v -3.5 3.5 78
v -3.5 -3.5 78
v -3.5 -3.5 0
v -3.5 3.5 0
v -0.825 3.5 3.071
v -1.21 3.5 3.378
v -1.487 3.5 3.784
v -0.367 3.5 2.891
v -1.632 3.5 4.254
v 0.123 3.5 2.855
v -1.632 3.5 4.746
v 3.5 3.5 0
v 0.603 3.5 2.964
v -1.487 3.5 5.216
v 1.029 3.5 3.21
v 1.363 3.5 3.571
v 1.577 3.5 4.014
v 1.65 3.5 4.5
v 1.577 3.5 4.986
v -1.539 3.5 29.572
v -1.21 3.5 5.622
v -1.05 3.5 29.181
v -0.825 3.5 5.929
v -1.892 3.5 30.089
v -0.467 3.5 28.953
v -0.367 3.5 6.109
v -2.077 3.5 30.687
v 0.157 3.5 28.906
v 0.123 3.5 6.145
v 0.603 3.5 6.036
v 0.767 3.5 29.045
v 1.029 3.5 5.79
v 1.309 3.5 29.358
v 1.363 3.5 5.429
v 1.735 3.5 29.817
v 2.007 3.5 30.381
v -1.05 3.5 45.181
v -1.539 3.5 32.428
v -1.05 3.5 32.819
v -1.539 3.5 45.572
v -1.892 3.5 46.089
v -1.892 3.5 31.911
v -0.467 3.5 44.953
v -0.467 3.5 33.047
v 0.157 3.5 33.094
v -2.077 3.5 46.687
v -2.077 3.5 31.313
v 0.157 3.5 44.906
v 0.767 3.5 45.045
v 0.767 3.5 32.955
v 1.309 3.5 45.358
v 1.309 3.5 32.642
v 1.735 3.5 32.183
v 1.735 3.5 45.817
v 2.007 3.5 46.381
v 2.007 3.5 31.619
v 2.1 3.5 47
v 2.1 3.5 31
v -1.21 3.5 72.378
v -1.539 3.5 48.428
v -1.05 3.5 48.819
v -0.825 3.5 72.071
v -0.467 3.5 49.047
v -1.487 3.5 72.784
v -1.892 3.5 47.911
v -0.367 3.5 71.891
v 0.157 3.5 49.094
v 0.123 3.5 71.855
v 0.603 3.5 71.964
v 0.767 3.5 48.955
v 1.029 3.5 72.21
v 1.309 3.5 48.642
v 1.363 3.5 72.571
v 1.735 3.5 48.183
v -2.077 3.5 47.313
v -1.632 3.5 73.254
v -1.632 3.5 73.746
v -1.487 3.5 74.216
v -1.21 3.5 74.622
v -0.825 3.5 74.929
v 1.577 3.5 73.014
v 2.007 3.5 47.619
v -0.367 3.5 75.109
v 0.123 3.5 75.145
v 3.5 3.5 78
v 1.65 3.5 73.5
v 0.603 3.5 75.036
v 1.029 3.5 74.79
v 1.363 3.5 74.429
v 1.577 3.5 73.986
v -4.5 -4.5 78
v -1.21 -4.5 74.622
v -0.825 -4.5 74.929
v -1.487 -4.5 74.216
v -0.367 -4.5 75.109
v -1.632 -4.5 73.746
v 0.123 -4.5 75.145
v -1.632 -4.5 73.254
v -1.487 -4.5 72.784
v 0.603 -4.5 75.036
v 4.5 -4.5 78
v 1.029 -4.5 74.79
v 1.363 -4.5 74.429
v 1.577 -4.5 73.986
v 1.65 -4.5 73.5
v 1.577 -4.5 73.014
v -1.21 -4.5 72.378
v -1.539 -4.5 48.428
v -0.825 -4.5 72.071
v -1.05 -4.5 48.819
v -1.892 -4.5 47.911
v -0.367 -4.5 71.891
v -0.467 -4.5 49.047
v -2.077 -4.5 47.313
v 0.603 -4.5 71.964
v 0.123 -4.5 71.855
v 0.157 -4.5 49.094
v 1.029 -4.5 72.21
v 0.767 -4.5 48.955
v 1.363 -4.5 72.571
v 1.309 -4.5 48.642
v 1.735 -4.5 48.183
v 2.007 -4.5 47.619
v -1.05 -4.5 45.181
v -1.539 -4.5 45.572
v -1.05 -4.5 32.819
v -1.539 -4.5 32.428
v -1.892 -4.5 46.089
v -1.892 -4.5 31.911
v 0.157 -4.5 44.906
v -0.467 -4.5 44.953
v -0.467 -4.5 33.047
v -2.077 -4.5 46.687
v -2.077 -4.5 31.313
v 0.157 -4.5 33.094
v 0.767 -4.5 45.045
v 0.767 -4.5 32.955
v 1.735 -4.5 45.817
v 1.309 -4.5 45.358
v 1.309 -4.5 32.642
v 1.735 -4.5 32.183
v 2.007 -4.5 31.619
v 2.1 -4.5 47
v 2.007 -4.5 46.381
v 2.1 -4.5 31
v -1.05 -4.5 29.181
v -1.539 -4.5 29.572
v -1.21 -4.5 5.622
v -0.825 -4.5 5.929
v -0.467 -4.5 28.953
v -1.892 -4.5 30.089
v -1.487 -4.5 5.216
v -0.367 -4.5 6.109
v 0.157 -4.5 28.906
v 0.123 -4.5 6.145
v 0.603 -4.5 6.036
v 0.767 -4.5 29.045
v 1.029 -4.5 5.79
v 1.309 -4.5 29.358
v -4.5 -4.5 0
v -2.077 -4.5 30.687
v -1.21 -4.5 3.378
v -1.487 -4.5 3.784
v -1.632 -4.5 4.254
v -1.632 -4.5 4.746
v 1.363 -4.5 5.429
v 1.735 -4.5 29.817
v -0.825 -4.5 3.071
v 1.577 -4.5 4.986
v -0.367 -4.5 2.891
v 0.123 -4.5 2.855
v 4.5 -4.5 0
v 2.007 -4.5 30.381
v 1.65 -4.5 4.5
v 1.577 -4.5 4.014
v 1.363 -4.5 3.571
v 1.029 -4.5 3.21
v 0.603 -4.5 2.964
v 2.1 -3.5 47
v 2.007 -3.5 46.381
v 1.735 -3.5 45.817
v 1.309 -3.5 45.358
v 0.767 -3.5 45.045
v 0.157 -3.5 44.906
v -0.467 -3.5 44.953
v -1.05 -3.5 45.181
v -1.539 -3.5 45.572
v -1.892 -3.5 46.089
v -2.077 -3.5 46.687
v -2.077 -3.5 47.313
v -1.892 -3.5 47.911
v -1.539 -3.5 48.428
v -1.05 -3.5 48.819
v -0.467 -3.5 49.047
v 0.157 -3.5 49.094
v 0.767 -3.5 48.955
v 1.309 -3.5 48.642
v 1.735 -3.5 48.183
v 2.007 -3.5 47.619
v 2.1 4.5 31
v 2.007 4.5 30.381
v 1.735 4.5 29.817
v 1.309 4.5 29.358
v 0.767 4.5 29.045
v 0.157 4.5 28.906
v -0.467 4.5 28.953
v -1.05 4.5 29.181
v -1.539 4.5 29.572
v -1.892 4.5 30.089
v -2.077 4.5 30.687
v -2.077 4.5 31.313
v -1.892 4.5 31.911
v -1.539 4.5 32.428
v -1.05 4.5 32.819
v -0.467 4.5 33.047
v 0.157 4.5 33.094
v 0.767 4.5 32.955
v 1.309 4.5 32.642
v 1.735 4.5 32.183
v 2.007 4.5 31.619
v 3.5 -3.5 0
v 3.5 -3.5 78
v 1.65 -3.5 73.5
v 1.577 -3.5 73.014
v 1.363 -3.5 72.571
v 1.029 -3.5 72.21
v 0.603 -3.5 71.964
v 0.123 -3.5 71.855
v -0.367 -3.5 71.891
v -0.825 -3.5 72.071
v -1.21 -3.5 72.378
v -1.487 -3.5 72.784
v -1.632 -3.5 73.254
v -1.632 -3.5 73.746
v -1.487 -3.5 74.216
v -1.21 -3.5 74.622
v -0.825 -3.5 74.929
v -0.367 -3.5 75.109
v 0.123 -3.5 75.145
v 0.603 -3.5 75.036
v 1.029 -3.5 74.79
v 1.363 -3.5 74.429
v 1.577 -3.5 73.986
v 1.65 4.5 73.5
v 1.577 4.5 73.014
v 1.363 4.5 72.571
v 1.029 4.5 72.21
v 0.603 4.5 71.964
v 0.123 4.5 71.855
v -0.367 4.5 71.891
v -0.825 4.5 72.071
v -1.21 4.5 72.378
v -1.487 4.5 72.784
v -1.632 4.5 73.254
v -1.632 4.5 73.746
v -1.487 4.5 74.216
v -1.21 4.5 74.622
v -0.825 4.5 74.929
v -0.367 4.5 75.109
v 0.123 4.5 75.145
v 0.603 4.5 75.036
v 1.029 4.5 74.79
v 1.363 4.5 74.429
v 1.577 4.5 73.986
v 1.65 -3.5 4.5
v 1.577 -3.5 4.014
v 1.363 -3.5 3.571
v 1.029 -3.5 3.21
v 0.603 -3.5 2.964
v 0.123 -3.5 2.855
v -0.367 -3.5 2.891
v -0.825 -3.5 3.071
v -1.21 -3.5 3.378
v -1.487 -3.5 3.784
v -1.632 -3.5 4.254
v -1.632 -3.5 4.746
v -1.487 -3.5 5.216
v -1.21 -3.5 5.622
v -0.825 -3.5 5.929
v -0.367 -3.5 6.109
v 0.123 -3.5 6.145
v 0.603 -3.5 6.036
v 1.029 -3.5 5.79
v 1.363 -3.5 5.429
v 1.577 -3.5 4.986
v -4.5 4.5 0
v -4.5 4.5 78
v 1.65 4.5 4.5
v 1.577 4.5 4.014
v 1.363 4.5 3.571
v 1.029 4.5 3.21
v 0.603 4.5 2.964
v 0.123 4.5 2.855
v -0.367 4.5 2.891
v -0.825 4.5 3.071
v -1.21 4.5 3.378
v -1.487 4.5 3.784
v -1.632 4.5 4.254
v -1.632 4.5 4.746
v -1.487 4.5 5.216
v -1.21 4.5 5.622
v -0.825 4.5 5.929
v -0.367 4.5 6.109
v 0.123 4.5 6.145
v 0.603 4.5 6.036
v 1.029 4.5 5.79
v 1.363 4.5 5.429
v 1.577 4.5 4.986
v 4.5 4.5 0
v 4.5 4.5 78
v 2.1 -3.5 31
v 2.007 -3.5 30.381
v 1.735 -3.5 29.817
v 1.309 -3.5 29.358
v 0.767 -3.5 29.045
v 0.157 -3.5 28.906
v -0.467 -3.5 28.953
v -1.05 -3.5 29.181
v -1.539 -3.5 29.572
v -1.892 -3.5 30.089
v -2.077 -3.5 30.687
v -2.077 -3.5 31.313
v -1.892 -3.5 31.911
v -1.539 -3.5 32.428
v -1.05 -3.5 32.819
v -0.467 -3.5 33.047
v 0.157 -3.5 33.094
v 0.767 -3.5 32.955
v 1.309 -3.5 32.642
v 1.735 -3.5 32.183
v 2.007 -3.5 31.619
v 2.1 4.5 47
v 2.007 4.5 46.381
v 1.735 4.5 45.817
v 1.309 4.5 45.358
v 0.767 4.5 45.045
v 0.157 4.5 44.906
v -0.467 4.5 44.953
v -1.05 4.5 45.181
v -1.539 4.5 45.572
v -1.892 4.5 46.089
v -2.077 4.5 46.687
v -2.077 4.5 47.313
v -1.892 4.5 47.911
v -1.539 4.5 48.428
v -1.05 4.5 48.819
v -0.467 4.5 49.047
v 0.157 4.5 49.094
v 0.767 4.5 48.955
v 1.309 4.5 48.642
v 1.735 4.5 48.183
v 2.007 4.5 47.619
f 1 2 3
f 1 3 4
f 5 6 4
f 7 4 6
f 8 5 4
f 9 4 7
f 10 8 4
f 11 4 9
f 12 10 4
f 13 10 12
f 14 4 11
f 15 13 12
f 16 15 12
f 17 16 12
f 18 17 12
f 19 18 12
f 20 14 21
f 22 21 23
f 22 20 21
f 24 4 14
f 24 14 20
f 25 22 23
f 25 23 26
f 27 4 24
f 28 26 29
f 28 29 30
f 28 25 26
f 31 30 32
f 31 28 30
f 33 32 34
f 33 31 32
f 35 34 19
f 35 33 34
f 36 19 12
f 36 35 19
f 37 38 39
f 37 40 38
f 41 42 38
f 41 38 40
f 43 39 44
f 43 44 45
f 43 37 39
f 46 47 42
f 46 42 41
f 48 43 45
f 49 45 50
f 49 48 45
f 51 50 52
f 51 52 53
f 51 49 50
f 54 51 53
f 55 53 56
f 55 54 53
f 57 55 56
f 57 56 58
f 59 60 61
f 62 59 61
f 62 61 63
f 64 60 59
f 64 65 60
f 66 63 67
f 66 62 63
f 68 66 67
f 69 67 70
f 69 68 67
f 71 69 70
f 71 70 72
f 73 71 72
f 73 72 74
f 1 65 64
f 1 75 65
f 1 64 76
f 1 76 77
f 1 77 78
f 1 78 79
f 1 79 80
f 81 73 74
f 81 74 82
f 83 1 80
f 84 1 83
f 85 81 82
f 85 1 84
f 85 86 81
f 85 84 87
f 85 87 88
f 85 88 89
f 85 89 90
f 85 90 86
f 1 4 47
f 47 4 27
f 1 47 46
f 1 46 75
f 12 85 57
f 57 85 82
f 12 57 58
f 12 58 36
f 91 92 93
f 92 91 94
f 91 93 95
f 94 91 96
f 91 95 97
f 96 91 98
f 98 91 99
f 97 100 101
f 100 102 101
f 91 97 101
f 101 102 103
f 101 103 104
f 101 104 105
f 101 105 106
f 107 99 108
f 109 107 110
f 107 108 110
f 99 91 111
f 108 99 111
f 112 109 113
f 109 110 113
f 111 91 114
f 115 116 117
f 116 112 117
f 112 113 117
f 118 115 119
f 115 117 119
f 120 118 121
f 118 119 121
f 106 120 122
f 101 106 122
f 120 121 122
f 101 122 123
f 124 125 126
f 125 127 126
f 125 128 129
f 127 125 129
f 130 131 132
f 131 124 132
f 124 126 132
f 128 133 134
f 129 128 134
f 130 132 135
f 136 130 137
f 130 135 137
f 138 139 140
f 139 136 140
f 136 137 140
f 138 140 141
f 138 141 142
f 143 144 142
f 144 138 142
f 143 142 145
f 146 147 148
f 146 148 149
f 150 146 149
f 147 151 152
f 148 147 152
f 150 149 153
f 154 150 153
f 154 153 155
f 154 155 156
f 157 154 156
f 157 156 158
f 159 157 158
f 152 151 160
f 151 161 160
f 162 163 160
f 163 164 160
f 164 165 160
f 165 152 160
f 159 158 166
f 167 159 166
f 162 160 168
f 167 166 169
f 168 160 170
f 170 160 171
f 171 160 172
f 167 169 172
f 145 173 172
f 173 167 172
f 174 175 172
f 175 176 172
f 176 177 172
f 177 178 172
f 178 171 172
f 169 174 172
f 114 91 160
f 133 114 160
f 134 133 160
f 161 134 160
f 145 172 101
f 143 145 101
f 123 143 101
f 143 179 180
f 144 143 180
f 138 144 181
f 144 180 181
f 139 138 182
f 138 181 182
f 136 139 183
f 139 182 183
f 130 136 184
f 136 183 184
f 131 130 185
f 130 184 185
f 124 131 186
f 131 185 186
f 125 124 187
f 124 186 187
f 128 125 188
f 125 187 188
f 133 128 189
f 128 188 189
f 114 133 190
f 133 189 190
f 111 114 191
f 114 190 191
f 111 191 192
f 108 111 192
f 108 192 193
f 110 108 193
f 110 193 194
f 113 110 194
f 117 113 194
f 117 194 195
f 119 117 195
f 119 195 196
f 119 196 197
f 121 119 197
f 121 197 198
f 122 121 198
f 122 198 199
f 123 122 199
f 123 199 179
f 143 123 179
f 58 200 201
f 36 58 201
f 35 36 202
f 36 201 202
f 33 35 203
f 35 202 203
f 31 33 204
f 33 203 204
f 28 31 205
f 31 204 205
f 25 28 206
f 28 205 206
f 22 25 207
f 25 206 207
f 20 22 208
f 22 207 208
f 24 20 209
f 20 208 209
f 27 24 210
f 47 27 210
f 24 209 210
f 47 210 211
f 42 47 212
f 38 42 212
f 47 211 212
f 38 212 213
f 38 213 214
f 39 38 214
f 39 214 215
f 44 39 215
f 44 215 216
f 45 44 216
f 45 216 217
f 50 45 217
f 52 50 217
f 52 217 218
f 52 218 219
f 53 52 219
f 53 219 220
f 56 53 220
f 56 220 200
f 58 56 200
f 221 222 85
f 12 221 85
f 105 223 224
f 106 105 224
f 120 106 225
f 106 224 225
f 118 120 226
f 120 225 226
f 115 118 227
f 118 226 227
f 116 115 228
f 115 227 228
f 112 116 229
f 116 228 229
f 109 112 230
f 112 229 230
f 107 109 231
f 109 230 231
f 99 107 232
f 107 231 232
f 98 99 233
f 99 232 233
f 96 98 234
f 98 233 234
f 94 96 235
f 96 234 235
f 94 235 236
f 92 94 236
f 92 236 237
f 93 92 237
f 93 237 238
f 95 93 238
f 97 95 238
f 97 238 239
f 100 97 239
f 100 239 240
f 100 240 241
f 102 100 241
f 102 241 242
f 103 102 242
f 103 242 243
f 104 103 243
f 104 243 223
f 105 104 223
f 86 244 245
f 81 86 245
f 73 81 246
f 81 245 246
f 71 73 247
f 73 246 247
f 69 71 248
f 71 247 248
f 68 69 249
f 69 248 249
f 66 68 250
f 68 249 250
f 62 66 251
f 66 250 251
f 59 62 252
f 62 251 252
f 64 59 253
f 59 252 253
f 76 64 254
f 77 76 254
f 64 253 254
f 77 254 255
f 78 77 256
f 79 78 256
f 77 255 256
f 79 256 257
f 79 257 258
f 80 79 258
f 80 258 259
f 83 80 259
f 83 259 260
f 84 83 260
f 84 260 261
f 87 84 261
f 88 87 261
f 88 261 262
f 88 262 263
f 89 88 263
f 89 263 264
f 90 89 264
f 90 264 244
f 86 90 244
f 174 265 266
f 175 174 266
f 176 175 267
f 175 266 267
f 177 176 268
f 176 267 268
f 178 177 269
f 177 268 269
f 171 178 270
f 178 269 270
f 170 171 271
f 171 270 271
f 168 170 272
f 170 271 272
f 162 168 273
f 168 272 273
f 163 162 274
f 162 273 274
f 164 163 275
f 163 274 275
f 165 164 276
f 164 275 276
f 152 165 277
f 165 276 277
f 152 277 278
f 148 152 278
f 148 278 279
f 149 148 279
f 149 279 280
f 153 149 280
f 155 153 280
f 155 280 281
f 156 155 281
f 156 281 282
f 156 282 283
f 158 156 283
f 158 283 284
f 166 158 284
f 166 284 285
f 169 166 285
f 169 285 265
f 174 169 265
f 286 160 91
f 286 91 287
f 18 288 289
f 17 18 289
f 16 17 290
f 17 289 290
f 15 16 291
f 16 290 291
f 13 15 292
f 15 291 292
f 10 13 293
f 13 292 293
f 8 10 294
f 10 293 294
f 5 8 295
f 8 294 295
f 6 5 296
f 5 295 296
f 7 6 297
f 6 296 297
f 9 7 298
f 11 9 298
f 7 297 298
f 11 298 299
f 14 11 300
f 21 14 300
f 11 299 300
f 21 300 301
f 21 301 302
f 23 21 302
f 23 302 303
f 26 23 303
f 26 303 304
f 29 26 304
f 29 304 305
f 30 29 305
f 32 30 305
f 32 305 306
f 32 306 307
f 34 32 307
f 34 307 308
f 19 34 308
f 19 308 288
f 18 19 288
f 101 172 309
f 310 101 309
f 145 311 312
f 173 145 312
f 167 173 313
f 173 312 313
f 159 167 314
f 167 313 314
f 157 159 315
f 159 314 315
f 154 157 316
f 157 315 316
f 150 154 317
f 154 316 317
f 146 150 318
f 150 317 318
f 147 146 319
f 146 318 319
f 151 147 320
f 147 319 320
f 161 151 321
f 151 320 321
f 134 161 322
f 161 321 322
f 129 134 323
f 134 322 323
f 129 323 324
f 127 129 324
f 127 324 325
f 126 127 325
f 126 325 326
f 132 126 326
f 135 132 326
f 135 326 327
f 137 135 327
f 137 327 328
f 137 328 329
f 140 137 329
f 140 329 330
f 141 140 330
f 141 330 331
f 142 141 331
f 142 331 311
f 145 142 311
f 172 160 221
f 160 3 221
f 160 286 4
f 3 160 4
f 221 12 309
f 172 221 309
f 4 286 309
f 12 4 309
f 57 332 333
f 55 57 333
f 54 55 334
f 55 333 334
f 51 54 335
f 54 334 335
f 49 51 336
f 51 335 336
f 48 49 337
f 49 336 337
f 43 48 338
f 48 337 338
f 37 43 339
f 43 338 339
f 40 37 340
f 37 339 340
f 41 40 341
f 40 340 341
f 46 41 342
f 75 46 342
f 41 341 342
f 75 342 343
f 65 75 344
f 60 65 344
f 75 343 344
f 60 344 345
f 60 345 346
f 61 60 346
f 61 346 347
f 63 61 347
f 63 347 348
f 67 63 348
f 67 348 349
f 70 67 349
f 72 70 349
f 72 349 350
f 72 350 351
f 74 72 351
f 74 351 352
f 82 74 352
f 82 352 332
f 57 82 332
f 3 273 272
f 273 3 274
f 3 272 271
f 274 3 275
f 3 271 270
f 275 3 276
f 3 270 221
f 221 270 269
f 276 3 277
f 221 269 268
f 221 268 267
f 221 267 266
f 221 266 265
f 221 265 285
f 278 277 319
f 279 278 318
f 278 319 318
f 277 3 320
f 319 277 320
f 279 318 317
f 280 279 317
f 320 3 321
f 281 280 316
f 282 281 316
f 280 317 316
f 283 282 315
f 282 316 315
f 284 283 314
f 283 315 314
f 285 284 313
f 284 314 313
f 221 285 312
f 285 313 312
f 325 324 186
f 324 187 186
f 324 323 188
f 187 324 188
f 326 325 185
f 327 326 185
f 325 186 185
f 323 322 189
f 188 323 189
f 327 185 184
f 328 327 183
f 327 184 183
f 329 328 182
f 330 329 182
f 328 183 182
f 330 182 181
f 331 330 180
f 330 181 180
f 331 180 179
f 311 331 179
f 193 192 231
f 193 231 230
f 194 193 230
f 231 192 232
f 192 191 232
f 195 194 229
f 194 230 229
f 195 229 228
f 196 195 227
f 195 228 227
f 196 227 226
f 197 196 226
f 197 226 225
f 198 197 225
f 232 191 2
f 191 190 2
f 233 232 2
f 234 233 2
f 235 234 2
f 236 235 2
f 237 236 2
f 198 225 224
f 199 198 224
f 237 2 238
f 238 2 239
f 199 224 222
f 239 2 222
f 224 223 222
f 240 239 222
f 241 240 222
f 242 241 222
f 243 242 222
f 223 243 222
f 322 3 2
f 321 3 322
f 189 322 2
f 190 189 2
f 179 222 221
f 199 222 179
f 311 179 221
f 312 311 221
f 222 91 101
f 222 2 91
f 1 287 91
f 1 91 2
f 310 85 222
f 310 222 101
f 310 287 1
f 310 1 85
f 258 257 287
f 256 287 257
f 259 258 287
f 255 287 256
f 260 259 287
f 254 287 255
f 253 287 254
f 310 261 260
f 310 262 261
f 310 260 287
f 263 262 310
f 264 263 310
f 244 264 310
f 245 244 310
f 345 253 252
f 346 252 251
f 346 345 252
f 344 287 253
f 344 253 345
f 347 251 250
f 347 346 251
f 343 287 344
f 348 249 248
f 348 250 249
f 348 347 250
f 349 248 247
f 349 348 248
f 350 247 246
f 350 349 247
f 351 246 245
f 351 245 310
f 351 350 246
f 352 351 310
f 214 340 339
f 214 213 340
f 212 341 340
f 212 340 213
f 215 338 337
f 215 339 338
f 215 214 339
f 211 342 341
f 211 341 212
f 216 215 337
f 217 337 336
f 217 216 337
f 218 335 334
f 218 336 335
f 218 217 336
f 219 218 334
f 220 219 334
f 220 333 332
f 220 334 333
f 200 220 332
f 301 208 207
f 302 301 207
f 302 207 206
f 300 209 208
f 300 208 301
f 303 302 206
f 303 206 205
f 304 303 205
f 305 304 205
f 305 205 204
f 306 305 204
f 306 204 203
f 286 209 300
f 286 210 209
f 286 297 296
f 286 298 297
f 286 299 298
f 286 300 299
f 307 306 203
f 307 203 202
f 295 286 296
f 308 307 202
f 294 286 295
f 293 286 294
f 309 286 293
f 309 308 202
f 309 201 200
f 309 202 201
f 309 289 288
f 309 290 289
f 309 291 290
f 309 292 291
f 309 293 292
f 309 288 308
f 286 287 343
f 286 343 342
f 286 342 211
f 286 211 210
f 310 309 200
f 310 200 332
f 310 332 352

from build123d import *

# Parameters (mm, degrees)
SKETCH_1_W          = 9
SKETCH_1_H          = 9
EXTRUDE_1_DEPTH     = 78
SKETCH_2_W          = 7
SKETCH_2_H          = 7
CUT_EXTRUDE_1_DEPTH = 90
SKETCH_3_R          = 1.65
CUT_EXTRUDE_2_DEPTH = 75
SKETCH_4_R          = 2.1
CUT_EXTRUDE_3_DEPTH = 75


with BuildPart() as part:
    # ｽｹｯﾁ1 → ﾎﾞｽ - 押し出し1 (new body)
    with BuildSketch(Plane.XY):
        Rectangle(SKETCH_1_W, SKETCH_1_H)
    extrude(amount=EXTRUDE_1_DEPTH)

    # ｽｹｯﾁ2 → ｶｯﾄ - 押し出し1 (cut)
    with BuildSketch(Plane.XY.offset(78)):
        Rectangle(SKETCH_2_W, SKETCH_2_H)
    extrude(amount=-CUT_EXTRUDE_1_DEPTH, mode=Mode.SUBTRACT)

    # ｽｹｯﾁ3 → ｶｯﾄ - 押し出し2 (cut)
    with BuildSketch(Plane(origin=(0, 4.5, 0), x_dir=(1, 0, 0), z_dir=(0, 1, 0))):
        with Locations((0, -4.5)):
            Circle(SKETCH_3_R)
        with Locations((0, -73.5)):
            Circle(SKETCH_3_R)
    extrude(amount=-CUT_EXTRUDE_2_DEPTH, mode=Mode.SUBTRACT)

    # ｽｹｯﾁ4 → ｶｯﾄ - 押し出し3 (cut)
    with BuildSketch(Plane(origin=(0, 4.5, 0), x_dir=(1, 0, 0), z_dir=(0, 1, 0))):
        with Locations((0, -31)):
            Circle(SKETCH_4_R)
        with Locations((0, -47)):
            Circle(SKETCH_4_R)
    extrude(amount=-CUT_EXTRUDE_3_DEPTH, mode=Mode.SUBTRACT)


solid = part.part
